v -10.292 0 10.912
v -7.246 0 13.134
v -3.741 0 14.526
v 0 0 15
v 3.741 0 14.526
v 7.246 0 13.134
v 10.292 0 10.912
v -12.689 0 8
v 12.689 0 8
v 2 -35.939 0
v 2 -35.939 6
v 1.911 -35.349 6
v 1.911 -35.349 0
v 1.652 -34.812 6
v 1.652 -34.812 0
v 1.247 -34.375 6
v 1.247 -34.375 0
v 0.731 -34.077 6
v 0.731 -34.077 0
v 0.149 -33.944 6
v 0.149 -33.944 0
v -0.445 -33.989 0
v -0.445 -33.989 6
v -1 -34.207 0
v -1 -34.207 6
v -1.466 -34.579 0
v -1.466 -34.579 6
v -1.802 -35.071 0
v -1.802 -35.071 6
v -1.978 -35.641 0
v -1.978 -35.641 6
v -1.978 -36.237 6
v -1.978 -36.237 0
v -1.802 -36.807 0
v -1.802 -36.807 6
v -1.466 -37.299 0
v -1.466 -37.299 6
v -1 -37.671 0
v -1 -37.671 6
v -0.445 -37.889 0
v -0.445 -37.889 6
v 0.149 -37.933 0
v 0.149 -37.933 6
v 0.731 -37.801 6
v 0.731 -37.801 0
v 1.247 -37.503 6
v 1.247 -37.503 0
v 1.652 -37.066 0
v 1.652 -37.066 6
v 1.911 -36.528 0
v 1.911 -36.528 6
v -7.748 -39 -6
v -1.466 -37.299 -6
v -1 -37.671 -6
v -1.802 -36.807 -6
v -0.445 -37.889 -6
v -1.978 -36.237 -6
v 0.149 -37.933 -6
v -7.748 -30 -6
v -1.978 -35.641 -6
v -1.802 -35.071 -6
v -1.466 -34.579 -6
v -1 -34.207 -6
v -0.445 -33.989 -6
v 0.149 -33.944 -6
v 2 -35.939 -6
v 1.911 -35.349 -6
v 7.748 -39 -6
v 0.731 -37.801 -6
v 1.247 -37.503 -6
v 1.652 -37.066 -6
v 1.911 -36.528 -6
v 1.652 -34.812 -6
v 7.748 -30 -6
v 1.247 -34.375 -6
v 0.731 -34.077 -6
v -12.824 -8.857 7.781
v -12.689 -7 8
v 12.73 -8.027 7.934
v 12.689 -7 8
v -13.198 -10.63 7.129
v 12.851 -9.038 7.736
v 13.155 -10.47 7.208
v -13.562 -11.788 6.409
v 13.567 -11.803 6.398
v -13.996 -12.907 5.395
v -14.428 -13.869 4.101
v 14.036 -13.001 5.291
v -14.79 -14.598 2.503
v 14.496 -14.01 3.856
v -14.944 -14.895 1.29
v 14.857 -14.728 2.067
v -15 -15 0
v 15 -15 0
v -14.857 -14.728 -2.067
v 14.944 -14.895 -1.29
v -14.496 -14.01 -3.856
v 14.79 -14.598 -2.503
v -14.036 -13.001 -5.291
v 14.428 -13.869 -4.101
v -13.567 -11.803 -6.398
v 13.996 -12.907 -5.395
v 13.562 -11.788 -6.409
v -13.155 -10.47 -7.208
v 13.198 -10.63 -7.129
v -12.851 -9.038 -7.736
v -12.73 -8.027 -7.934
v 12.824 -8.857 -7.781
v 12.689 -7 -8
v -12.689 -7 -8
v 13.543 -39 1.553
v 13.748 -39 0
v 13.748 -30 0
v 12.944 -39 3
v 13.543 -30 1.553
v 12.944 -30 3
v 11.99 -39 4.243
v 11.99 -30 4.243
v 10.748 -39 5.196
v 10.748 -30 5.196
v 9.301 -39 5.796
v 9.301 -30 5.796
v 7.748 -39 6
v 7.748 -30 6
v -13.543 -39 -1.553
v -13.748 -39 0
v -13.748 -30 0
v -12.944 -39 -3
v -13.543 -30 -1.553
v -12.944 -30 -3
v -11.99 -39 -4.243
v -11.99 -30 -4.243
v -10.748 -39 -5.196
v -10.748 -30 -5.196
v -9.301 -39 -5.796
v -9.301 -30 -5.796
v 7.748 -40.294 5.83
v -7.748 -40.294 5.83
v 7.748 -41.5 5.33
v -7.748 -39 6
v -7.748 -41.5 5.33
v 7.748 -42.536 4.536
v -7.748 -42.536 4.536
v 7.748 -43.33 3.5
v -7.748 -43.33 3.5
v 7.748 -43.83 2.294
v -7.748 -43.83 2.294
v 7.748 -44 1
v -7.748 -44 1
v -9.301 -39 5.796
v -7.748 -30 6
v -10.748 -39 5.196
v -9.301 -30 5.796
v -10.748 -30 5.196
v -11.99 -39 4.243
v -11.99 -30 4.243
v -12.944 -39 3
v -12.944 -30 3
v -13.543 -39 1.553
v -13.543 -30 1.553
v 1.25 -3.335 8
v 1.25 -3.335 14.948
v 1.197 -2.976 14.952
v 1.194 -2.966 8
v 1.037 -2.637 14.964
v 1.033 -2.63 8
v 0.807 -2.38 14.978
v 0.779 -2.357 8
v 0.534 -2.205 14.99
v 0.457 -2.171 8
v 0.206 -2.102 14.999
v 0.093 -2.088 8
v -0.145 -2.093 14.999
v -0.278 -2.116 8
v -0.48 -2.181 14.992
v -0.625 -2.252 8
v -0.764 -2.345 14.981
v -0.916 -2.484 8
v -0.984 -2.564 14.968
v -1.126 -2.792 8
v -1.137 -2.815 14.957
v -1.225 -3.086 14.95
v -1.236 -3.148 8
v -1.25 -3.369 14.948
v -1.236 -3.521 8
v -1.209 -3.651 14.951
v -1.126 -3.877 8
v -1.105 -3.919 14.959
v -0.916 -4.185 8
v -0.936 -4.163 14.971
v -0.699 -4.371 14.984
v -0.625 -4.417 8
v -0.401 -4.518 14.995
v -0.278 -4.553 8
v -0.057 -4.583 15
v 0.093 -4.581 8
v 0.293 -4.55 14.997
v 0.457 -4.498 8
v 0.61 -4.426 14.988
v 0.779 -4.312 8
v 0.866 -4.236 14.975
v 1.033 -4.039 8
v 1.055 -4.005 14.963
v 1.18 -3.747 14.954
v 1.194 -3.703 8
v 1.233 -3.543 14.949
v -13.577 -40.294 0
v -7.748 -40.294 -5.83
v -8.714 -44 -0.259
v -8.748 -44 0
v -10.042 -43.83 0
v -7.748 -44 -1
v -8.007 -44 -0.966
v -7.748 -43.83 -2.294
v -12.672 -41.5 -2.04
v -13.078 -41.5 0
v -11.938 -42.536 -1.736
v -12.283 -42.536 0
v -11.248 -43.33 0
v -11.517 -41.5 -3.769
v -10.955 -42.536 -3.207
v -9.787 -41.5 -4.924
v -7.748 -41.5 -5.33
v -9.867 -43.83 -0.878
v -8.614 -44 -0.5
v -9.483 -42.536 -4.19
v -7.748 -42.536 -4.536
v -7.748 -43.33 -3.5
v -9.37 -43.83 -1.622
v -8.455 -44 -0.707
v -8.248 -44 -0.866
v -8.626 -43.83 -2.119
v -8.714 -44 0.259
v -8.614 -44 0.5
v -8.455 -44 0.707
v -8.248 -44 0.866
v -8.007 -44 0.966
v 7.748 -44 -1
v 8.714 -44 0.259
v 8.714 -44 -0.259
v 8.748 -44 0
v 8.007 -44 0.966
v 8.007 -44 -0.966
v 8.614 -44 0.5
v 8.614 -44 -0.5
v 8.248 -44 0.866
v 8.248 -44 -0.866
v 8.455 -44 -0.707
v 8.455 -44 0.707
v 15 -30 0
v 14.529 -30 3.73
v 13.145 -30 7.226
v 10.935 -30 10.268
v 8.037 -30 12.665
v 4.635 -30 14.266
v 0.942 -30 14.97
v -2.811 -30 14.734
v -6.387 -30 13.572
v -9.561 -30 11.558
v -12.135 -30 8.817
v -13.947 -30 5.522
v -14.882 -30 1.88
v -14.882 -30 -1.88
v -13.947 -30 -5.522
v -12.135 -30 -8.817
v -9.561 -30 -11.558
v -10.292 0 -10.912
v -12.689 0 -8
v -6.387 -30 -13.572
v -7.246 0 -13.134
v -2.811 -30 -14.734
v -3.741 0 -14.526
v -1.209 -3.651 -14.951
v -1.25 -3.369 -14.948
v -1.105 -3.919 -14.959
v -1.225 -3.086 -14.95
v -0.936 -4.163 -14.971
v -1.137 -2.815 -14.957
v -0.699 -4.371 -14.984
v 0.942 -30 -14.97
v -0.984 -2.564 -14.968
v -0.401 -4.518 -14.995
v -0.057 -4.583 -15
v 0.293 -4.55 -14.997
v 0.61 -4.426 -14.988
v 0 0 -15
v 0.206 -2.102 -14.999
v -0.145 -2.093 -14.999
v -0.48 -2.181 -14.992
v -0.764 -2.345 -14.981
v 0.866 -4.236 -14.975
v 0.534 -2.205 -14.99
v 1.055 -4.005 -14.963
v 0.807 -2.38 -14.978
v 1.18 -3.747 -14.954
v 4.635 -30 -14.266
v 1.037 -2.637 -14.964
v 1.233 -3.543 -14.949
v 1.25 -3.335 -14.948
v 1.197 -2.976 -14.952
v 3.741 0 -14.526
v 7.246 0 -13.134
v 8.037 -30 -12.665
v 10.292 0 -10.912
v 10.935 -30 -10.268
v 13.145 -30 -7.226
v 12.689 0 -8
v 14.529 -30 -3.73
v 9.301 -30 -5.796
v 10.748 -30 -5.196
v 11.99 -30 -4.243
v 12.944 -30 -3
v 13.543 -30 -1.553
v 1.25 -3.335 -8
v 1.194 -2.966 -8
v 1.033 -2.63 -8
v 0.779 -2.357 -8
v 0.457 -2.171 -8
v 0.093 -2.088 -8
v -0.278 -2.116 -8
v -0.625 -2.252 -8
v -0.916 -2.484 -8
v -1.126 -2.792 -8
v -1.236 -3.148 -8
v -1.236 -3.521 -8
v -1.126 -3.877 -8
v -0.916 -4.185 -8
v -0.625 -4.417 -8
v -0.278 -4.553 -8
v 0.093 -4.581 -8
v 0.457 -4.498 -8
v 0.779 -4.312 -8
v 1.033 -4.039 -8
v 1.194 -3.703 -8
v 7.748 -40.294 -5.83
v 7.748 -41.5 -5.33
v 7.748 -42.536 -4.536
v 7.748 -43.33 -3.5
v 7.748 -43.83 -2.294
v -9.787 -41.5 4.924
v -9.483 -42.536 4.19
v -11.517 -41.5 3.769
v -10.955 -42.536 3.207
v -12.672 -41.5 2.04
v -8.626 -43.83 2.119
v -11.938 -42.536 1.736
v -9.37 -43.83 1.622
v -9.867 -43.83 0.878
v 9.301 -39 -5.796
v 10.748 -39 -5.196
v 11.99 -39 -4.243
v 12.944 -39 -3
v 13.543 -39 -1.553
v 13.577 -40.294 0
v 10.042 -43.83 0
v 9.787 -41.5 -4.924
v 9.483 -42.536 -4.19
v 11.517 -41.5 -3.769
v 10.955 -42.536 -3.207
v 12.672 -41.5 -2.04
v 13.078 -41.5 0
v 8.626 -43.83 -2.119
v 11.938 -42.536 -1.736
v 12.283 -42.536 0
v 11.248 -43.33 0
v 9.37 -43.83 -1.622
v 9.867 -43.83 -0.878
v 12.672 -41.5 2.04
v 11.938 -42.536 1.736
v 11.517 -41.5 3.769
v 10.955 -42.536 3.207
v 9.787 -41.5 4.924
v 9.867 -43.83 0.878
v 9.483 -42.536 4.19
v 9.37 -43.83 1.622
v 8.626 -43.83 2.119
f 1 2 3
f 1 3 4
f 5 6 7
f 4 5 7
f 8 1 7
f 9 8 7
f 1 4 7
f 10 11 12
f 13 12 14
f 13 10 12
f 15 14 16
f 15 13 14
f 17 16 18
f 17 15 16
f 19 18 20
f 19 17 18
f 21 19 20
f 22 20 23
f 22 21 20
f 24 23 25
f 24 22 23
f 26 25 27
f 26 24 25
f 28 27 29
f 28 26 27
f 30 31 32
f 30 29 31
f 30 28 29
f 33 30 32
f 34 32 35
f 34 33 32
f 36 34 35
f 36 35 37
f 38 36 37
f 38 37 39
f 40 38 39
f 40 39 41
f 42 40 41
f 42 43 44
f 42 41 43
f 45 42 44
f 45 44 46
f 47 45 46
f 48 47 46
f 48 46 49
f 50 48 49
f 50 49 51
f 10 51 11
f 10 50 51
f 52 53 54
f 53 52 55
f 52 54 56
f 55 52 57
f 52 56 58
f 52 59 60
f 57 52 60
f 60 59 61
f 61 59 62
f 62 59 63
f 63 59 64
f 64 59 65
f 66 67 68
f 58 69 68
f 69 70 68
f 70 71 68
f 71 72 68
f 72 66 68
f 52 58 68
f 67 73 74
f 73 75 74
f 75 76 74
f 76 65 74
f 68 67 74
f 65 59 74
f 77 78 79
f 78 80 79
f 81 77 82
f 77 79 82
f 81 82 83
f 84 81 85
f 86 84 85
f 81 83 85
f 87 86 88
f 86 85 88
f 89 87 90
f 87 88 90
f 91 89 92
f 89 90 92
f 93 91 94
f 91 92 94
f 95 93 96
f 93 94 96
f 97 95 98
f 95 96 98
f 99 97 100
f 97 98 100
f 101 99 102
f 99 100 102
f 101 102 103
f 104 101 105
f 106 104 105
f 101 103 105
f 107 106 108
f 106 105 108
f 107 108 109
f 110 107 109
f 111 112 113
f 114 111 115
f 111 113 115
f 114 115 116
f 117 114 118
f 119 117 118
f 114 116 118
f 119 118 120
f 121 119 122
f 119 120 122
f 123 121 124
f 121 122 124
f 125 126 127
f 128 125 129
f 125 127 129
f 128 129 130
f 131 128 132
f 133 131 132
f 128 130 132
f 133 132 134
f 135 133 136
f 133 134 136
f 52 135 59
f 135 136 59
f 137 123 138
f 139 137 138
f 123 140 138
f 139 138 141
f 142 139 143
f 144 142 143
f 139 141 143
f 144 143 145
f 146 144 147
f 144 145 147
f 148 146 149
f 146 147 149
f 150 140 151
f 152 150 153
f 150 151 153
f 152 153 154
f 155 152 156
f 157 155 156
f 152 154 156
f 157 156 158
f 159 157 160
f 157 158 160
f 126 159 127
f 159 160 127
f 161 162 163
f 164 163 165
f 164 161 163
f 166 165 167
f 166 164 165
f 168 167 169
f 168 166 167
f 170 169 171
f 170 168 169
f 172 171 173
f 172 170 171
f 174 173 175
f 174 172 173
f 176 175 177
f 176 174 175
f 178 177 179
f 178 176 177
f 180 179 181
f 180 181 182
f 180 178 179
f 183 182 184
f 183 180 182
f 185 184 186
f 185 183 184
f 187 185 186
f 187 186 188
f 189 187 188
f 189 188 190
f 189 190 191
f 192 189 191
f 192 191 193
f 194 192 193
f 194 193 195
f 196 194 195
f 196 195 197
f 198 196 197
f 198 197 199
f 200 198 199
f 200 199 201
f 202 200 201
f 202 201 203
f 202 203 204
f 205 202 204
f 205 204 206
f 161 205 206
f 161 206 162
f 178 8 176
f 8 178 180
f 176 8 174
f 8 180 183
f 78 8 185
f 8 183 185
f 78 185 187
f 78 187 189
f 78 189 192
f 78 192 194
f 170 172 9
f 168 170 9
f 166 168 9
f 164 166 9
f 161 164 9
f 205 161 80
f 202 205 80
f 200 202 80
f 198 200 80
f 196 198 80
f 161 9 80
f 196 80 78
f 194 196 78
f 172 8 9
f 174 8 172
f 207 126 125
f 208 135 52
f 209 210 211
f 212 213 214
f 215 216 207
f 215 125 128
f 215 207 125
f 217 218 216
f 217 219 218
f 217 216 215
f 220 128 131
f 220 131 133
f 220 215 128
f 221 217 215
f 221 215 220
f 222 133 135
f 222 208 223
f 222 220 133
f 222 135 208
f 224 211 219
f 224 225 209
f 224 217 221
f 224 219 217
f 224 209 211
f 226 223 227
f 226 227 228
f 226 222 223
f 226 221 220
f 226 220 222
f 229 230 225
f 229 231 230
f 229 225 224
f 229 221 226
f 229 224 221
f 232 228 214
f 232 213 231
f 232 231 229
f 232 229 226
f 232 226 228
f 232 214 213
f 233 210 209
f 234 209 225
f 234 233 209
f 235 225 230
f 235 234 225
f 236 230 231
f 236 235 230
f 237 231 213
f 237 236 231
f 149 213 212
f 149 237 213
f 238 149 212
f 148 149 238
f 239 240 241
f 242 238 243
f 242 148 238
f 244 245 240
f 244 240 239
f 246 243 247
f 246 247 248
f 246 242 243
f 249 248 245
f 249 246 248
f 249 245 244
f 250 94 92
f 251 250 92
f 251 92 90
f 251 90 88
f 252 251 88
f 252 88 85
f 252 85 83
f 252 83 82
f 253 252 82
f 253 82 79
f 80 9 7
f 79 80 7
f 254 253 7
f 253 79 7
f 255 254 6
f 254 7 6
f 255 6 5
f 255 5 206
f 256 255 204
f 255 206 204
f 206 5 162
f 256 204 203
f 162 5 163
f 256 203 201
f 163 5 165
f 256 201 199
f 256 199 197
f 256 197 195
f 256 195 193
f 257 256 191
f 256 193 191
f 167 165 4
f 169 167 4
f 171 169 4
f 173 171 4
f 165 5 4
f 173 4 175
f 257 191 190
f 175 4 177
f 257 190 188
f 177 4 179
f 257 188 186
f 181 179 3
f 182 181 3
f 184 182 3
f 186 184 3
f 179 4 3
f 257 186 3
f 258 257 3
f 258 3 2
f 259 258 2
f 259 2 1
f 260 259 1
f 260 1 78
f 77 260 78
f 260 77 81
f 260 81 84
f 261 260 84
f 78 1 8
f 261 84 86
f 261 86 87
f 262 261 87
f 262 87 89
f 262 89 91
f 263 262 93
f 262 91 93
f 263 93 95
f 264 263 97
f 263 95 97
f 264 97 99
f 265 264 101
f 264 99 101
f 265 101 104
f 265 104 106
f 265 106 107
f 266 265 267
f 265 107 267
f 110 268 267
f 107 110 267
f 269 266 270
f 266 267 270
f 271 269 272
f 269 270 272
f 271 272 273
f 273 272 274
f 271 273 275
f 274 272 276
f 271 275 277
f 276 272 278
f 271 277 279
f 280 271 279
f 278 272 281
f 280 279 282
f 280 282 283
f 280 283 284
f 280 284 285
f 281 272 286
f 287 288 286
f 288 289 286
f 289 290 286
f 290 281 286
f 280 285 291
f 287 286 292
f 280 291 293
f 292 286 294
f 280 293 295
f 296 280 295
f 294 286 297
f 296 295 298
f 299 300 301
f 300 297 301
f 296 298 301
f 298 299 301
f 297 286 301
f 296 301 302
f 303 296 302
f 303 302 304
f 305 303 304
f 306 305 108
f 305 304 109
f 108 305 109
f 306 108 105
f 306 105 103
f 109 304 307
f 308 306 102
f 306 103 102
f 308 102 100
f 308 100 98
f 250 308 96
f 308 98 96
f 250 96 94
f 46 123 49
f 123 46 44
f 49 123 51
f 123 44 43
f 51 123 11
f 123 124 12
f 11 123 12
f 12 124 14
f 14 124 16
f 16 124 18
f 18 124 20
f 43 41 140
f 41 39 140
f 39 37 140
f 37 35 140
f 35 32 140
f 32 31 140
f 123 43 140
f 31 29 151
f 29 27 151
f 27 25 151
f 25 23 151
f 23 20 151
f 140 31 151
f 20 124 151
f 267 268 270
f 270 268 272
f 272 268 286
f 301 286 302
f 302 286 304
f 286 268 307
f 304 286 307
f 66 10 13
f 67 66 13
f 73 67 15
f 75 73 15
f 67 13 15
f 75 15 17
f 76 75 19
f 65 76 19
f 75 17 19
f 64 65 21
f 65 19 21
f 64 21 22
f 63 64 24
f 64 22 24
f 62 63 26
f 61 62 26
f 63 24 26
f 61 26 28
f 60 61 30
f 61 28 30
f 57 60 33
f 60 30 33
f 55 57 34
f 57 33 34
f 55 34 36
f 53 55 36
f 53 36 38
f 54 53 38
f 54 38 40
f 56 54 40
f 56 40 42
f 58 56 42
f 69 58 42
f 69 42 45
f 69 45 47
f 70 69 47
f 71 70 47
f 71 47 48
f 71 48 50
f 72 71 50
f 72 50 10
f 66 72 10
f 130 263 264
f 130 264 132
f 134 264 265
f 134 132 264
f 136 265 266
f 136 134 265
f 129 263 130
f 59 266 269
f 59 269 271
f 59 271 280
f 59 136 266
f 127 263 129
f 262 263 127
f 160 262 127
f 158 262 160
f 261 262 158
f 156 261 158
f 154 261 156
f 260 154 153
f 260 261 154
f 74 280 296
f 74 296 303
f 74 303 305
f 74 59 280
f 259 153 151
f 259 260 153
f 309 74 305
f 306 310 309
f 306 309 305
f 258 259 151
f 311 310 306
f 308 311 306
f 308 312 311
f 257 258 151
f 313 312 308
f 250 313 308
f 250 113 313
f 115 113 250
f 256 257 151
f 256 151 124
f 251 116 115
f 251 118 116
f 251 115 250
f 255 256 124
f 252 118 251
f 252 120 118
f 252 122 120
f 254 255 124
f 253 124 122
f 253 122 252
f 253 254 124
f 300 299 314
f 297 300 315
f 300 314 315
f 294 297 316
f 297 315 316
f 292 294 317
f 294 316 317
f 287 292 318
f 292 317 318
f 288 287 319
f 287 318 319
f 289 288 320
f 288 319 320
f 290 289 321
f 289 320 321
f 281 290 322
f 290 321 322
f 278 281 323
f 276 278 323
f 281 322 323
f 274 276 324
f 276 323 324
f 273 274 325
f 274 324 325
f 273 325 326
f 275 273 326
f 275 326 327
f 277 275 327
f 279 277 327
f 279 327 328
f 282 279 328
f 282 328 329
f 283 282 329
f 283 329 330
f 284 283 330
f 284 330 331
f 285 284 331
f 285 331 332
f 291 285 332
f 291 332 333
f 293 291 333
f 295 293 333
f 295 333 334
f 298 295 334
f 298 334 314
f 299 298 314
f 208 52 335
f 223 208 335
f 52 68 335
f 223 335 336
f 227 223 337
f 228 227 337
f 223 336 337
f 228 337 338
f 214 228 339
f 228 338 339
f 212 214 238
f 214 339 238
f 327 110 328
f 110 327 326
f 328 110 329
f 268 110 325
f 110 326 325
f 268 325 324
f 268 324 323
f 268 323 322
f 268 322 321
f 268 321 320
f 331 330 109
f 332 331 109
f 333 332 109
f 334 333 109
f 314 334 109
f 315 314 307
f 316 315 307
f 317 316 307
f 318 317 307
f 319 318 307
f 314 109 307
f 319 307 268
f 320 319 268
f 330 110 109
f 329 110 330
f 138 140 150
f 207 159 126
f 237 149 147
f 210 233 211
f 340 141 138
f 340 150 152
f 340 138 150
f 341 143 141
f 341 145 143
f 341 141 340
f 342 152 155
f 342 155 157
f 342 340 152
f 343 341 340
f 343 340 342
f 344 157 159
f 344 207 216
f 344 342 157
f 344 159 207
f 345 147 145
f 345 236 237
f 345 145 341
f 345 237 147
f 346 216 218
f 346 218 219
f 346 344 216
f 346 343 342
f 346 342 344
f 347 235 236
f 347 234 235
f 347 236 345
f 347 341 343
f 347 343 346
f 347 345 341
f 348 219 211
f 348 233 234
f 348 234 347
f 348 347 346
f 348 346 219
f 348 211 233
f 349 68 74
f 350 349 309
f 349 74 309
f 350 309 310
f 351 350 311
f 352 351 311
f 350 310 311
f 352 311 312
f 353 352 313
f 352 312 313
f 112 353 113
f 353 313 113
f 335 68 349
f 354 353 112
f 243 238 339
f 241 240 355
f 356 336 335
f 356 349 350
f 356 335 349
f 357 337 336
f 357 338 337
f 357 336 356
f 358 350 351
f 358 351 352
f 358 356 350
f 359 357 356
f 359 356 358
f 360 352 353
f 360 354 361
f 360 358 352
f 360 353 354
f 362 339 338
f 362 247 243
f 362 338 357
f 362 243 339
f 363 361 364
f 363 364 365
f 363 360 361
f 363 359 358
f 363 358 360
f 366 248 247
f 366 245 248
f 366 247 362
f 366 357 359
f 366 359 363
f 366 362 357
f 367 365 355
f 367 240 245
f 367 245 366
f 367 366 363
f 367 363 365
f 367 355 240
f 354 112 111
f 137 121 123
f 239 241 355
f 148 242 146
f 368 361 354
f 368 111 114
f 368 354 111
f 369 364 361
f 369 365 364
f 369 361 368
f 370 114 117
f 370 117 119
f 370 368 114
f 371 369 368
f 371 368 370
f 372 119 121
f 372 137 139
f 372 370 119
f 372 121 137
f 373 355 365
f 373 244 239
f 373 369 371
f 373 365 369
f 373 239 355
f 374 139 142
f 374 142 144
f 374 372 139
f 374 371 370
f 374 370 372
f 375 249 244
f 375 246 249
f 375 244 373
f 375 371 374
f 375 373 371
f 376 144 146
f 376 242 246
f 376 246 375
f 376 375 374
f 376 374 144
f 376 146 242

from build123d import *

# Parameters (mm, degrees)
F0_R           = 15
F1_DEPTH       = 30
F3_DEPTH       = 25
F3_DEPTH_BACK  = 25
F5_DEPTH       = 14
F6_R           = 5
F7_R           = 2
F8_DEPTH       = 25
F8_DEPTH_BACK  = 25
F9_R           = 1.25
F10_DEPTH      = 25
F10_DEPTH_BACK = 25


with BuildPart() as f1:
    # F0 (on Front) → F1 (new body)
    with BuildSketch(Plane.XZ):
        Circle(F0_R)
    extrude(amount=F1_DEPTH)

    # F2 (on Right) → F3 (cut, two sides)
    with BuildSketch(Plane.YZ) as f3_sk:
        with BuildLine():
            Line((15, 8), (-7, 8))
            ThreePointArc((-7, 8), (-12.6568542495, 5.6568542495), (-15, 0))
            ThreePointArc((-15, 0), (-12.6568542495, -5.6568542495), (-7, -8))
            Line((-7, -8), (15, -8))
            Line((15, -8), (15, 8))
        make_face()
    extrude(amount=-F3_DEPTH, mode=Mode.SUBTRACT)
    extrude(f3_sk.sketch, amount=F3_DEPTH_BACK, mode=Mode.SUBTRACT)

    # F4 (on face) → F5 (join)
    with BuildSketch(Plane.XZ.offset(30)):
        with BuildLine():
            ThreePointArc((13.7477270849, 0), (11.990367772, 4.2426406871), (7.7477270849, 6))
            Line((7.7477270849, 6), (-7.7477270849, 6))
            ThreePointArc((-7.7477270849, 6), (-11.990367772, 4.2426406871), (-13.7477270849, 0))
            ThreePointArc((-13.7477270849, 0), (-11.990367772, -4.2426406871), (-7.7477270849, -6))
            Line((-7.7477270849, -6), (7.7477270849, -6))
            ThreePointArc((7.7477270849, -6), (11.990367772, -4.2426406871), (13.7477270849, 0))
        make_face()
    extrude(amount=F5_DEPTH)

    # F6
    f6_edges = [f1.edges().sort_by_distance(p)[0] for p in [
        (13.747727, -44, 0),
        (0, -44, 6),
        (-13.747727, -44, 0),
        (0, -44, -6),
    ]]
    fillet(f6_edges, radius=F6_R)

    # F7 (on Top) → F8 (cut, two sides)
    with BuildSketch(Plane.XY) as f8_sk:
        with Locations((0, -35.9389074147)):
            Circle(F7_R)
    extrude(amount=-F8_DEPTH, mode=Mode.SUBTRACT)
    extrude(f8_sk.sketch, amount=F8_DEPTH_BACK, mode=Mode.SUBTRACT)

    # F9 (on Top) → F10 (cut, two sides)
    with BuildSketch(Plane.XY) as f10_sk:
        with Locations((0, -3.3346442506)):
            Circle(F9_R)
    extrude(amount=-F10_DEPTH, mode=Mode.SUBTRACT)
    extrude(f10_sk.sketch, amount=F10_DEPTH_BACK, mode=Mode.SUBTRACT)


solid = f1.part
